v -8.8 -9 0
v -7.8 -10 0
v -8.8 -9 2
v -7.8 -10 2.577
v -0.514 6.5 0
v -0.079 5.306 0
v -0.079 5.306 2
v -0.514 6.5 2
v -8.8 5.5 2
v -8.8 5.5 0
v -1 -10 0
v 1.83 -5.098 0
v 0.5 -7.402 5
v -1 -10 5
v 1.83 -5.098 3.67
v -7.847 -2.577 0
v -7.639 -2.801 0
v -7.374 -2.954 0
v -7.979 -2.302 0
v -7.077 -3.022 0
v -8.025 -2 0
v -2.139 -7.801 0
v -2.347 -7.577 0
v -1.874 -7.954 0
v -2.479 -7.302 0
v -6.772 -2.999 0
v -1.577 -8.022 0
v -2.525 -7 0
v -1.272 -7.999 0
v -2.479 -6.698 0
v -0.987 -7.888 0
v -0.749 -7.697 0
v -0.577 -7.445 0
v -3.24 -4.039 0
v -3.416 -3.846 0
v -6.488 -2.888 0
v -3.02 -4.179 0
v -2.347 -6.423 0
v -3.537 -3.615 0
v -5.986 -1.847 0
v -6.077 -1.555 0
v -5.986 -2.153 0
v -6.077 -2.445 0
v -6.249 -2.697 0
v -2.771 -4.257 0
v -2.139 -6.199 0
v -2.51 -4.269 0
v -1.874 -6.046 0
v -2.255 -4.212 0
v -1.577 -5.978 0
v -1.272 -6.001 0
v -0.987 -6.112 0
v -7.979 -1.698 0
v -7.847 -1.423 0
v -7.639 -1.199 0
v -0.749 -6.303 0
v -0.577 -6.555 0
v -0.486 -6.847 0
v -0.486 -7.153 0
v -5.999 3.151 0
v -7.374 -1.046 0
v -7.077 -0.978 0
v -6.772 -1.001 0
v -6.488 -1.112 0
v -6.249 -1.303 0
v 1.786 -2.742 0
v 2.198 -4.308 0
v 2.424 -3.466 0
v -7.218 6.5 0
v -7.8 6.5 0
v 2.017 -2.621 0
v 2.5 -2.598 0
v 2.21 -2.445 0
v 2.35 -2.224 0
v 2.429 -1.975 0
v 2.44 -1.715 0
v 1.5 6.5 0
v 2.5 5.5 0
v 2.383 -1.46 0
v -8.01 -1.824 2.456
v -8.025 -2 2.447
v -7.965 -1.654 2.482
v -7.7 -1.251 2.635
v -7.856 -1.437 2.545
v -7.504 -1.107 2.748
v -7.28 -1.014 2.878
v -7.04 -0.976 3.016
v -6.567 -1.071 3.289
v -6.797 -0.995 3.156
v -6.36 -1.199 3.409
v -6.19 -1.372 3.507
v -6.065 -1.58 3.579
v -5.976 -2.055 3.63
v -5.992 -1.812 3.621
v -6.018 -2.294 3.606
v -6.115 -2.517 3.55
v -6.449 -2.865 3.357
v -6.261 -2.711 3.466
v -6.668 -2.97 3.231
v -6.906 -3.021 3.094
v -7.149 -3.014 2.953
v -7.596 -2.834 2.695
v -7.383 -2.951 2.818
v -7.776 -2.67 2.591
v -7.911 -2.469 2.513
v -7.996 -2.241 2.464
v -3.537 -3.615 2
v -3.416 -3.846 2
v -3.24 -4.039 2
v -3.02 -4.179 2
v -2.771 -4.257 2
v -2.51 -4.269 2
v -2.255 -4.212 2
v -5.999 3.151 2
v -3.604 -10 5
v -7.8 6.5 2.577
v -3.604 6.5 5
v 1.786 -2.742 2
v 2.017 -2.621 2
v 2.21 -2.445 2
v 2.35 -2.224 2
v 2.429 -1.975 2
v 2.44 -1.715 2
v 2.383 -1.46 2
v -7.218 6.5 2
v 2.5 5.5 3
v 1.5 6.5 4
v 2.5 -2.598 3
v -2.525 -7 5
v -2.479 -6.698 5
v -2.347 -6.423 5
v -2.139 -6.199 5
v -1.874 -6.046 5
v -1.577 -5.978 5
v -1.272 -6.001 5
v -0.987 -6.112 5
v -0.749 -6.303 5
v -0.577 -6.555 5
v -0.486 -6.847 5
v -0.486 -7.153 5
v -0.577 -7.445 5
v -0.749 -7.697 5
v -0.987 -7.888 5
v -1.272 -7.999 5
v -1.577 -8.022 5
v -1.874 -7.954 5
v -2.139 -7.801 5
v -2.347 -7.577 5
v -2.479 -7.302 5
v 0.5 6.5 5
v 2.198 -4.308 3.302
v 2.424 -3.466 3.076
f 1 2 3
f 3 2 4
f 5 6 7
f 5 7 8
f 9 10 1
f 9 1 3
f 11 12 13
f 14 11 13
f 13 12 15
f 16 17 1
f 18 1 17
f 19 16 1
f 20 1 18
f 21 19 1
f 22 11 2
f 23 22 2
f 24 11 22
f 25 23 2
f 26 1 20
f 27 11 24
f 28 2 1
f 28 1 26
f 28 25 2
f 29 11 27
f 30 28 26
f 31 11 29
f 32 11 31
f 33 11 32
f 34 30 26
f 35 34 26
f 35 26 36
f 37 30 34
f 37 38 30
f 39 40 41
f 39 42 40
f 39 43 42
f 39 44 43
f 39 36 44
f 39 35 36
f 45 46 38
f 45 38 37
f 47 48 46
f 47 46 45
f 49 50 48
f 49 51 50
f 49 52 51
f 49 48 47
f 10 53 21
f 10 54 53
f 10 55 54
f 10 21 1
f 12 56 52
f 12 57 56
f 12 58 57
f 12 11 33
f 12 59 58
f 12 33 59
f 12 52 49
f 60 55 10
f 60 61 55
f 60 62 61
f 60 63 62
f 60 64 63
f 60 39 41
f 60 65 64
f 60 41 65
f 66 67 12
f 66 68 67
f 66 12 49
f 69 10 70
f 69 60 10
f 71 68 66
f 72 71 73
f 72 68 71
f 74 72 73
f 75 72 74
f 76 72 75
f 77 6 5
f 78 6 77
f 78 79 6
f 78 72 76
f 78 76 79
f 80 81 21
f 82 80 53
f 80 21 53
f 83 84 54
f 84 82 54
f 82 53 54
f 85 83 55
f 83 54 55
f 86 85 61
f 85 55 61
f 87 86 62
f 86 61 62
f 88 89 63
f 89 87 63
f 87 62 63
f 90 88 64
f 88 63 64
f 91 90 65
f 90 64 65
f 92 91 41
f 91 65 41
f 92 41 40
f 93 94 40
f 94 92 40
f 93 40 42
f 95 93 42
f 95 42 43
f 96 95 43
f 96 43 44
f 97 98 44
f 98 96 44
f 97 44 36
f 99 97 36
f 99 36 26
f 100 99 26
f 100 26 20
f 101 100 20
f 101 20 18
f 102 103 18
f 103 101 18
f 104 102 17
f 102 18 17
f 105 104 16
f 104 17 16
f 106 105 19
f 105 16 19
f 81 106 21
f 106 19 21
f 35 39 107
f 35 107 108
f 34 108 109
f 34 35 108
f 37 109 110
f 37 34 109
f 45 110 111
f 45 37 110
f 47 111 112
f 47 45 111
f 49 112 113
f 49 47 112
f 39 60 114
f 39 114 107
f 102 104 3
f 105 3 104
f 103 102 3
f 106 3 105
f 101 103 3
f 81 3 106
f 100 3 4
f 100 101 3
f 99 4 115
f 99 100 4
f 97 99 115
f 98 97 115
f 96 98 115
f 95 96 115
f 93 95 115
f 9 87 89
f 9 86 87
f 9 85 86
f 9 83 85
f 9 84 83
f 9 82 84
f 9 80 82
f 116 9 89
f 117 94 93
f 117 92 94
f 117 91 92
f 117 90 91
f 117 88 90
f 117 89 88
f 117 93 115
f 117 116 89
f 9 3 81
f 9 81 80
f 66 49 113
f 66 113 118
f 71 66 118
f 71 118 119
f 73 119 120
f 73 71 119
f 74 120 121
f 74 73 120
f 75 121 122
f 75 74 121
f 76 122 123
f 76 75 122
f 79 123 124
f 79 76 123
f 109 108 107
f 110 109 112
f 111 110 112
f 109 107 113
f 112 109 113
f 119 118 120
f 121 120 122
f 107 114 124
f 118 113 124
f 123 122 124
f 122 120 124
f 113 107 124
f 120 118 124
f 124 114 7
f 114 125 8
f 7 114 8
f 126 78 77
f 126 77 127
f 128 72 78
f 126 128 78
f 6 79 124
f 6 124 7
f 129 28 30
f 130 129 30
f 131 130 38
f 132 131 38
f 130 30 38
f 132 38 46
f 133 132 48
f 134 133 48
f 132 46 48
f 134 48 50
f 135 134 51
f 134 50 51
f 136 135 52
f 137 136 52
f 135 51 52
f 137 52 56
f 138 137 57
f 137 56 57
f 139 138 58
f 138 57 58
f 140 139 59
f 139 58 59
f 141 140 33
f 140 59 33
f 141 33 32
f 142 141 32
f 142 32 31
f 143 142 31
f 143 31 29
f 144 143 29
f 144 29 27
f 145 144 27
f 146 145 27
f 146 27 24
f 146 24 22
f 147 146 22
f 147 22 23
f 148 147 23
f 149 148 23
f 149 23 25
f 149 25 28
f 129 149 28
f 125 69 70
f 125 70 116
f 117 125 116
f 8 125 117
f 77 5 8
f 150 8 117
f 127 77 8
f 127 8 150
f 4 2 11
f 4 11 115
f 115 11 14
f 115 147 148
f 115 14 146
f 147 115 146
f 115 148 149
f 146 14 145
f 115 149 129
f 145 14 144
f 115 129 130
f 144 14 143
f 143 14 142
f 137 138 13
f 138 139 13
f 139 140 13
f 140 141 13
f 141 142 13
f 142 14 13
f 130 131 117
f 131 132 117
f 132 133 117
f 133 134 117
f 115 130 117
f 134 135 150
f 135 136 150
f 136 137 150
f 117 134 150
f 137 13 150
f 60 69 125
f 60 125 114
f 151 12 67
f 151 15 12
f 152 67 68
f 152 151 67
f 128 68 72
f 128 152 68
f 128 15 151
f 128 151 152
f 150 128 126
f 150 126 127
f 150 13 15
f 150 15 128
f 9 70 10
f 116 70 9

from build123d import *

# Parameters (mm, degrees)
SKETCH_1_W              = 5
SKETCH_1_H              = 20
EXTRUDE_1_DEPTH         = 5
SKETCH1_W               = 5
SKETCH1_H               = 20
EXTRUDE1_DEPTH          = 6.8
M2_5_TAPPED_HOLE1_D     = 2.05
M2_5_TAPPED_HOLE1_DEPTH = 6.35
M2_5_TAPPED_HOLE1_TIP   = 0.615882135
EXTRUDE2_DEPTH          = 2
CHAMFER1_SIZE           = 2
EXTRUDE3_START          = -5
SKETCH3_W               = 11.8
SKETCH3_H               = 3.5
EXTRUDE3_DEPTH          = 5
EXTRUDE4_DEPTH          = 2
CHAMFER2_SIZE           = 1
CHAMFER4_SIZE           = 3.5
CHAMFER4_SIZE2          = 6.062177826
SKETCH8_W               = 1
SKETCH8_H               = 16.5
EXTRUDE6_DEPTH          = 10
SKETCH11_W              = 5
SKETCH11_H              = 16.5
EXTRUDE8_DEPTH          = 0.5
EXTRUDE7_REACH          = 21.357
CHAMFER7_SIZE           = 1
FILLET1_R               = 5


with BuildPart() as part:
    # 草图1 → 拉伸1 (new body)
    with BuildSketch(Plane.XY):
        Rectangle(SKETCH_1_W, SKETCH_1_H)
    extrude(amount=EXTRUDE_1_DEPTH)

    # Sketch1 → Extrude1 (add)
    with BuildSketch(Plane.ZY.offset(2.5)):
        with Locations((2.5, 0)):
            Rectangle(SKETCH1_W, SKETCH1_H)
    extrude(amount=EXTRUDE1_DEPTH)

    # M2.5 Tapped Hole1
    with Locations(Plane(origin=(-1.5, -7, 5), x_dir=(1, 0, 0), z_dir=(0, 0, 1))):
        with Locations((0, 0), (-5.5, 5)):
            Hole(M2_5_TAPPED_HOLE1_D / 2, depth=M2_5_TAPPED_HOLE1_DEPTH)
            with Locations((0, 0, -(M2_5_TAPPED_HOLE1_DEPTH + M2_5_TAPPED_HOLE1_TIP / 2))):  # 118° drill point
                Cone(0, M2_5_TAPPED_HOLE1_D / 2, M2_5_TAPPED_HOLE1_TIP, mode=Mode.SUBTRACT)

    # Sketch2 → Extrude2 (cut)
    with BuildSketch(Plane(origin=(0, 0, 0), x_dir=(-1, 0, 0), z_dir=(0, 0, -1))):
        with BuildLine():
            Line((-2.383486142, -1.459806625), (0.079058889, 5.305980245))
            ThreePointArc((0.079058889, 5.305980245), (0.596133249, 5.870267889), (1.360771654, 5.903652722))
            Line((1.360771654, 5.903652722), (5.401449923, 4.432966106))
            ThreePointArc((5.401449923, 4.432966106), (5.965737567, 3.915891747), (5.9991224, 3.151253342))
            Line((5.9991224, 3.151253342), (3.536577368, -3.614533528))
            ThreePointArc((3.536577368, -3.614533528), (3.019503009, -4.178821171), (2.254864604, -4.212206005))
            Line((2.254864604, -4.212206005), (-1.785813665, -2.741519389))
            ThreePointArc((-1.785813665, -2.741519389), (-2.350101309, -2.22444503), (-2.383486142, -1.459806625))
        make_face()
    extrude(amount=-EXTRUDE2_DEPTH, mode=Mode.SUBTRACT)

    # Chamfer1
    chamfer1_edges = [part.edges().sort_by_distance(p)[0] for p in [
        (2.5, 0, 5),
    ]]
    chamfer(chamfer1_edges, length=CHAMFER1_SIZE)

    # Sketch3 → Extrude3 (cut)
    with BuildSketch(Plane.XY.offset(5).offset(EXTRUDE3_START)):
        with Locations((-3.4, 8.25)):
            Rectangle(SKETCH3_W, SKETCH3_H)
    extrude(amount=EXTRUDE3_DEPTH, mode=Mode.SUBTRACT)

    # Sketch4 → Extrude4 (cut)
    with BuildSketch(Plane(origin=(0, 0, 0), x_dir=(-1, 0, 0), z_dir=(0, 0, -1))):
        Polygon((-0.262961254, 4.366287624), (1.447139463, 9.064750728), (7.367202974, 6.910023825), (5.657102257, 2.211560721), align=None)
    extrude(amount=-EXTRUDE4_DEPTH, mode=Mode.SUBTRACT)

    # Chamfer2
    chamfer2_edges = [part.edges().sort_by_distance(p)[0] for p in [
        (-9.3, 6.5, 2.5),
    ]]
    chamfer(chamfer2_edges, length=CHAMFER2_SIZE)

    # Chamfer4
    chamfer4_edges = [part.edges().sort_by_distance(p)[0] for p in [
        (2.5, -10, 1.5),
    ]]
    chamfer4_side = [part.faces().sort_by_distance(p)[0] for p in [
        (-3.583625731, -10, 2.435672515),
    ]]
    chamfer(chamfer4_edges, length=CHAMFER4_SIZE, length2=CHAMFER4_SIZE2, reference=chamfer4_side[0])

    # Sketch8 → Extrude6 (cut)
    with BuildSketch(Plane.XY.offset(5)):
        with Locations((-8.8, -1.75)):
            Rectangle(SKETCH8_W, SKETCH8_H)
    extrude(amount=-EXTRUDE6_DEPTH, mode=Mode.SUBTRACT)

    # Sketch11 → Extrude8 (add)
    with BuildSketch(Plane.ZY.offset(8.3)):
        with Locations((2.5, -1.75)):
            Rectangle(SKETCH11_W, SKETCH11_H)
    extrude(amount=EXTRUDE8_DEPTH)

    # Extrude7: up to this face of the body (flat: up to its plane)
    extrude7_end = Plane(part.part.faces().sort_by_distance((-4.9, -10, 2.5))[0])
    # Sketch10 → Extrude7 (cut, up to the picked face)
    with BuildSketch(Plane(origin=(0, 6.5, 0), x_dir=(1, 0, 0), z_dir=(0, 1, 0)), mode=Mode.PRIVATE) as extrude7_sk1:
        Polygon((-8.8, -2), (-3.603847577, -5), (-8.8, -5), align=None)
    extrude7_tool1 = split(extrude(extrude7_sk1.sketch, amount=-EXTRUDE7_REACH, mode=Mode.PRIVATE), bisect_by=extrude7_end, keep=Keep.BOTH, mode=Mode.PRIVATE)
    add(extrude7_tool1.solids().sort_by(Axis((-7.067949, 6.5, 4), (0, -1, 0)))[0], mode=Mode.SUBTRACT)

    # Chamfer7
    chamfer7_edges = [part.edges().sort_by_distance(p)[0] for p in [
        (-8.8, -10, 1),
        (-8.8, 6.5, 1),
        (2.5, 6.5, 1.5),
    ]]
    chamfer(chamfer7_edges, length=CHAMFER7_SIZE)

    # Fillet1
    fillet1_edges = [part.edges().sort_by_distance(p)[0] for p in [
        (2.5, -3.937822174, 1.5),
    ]]
    fillet(fillet1_edges, radius=FILLET1_R)


solid = part.part
